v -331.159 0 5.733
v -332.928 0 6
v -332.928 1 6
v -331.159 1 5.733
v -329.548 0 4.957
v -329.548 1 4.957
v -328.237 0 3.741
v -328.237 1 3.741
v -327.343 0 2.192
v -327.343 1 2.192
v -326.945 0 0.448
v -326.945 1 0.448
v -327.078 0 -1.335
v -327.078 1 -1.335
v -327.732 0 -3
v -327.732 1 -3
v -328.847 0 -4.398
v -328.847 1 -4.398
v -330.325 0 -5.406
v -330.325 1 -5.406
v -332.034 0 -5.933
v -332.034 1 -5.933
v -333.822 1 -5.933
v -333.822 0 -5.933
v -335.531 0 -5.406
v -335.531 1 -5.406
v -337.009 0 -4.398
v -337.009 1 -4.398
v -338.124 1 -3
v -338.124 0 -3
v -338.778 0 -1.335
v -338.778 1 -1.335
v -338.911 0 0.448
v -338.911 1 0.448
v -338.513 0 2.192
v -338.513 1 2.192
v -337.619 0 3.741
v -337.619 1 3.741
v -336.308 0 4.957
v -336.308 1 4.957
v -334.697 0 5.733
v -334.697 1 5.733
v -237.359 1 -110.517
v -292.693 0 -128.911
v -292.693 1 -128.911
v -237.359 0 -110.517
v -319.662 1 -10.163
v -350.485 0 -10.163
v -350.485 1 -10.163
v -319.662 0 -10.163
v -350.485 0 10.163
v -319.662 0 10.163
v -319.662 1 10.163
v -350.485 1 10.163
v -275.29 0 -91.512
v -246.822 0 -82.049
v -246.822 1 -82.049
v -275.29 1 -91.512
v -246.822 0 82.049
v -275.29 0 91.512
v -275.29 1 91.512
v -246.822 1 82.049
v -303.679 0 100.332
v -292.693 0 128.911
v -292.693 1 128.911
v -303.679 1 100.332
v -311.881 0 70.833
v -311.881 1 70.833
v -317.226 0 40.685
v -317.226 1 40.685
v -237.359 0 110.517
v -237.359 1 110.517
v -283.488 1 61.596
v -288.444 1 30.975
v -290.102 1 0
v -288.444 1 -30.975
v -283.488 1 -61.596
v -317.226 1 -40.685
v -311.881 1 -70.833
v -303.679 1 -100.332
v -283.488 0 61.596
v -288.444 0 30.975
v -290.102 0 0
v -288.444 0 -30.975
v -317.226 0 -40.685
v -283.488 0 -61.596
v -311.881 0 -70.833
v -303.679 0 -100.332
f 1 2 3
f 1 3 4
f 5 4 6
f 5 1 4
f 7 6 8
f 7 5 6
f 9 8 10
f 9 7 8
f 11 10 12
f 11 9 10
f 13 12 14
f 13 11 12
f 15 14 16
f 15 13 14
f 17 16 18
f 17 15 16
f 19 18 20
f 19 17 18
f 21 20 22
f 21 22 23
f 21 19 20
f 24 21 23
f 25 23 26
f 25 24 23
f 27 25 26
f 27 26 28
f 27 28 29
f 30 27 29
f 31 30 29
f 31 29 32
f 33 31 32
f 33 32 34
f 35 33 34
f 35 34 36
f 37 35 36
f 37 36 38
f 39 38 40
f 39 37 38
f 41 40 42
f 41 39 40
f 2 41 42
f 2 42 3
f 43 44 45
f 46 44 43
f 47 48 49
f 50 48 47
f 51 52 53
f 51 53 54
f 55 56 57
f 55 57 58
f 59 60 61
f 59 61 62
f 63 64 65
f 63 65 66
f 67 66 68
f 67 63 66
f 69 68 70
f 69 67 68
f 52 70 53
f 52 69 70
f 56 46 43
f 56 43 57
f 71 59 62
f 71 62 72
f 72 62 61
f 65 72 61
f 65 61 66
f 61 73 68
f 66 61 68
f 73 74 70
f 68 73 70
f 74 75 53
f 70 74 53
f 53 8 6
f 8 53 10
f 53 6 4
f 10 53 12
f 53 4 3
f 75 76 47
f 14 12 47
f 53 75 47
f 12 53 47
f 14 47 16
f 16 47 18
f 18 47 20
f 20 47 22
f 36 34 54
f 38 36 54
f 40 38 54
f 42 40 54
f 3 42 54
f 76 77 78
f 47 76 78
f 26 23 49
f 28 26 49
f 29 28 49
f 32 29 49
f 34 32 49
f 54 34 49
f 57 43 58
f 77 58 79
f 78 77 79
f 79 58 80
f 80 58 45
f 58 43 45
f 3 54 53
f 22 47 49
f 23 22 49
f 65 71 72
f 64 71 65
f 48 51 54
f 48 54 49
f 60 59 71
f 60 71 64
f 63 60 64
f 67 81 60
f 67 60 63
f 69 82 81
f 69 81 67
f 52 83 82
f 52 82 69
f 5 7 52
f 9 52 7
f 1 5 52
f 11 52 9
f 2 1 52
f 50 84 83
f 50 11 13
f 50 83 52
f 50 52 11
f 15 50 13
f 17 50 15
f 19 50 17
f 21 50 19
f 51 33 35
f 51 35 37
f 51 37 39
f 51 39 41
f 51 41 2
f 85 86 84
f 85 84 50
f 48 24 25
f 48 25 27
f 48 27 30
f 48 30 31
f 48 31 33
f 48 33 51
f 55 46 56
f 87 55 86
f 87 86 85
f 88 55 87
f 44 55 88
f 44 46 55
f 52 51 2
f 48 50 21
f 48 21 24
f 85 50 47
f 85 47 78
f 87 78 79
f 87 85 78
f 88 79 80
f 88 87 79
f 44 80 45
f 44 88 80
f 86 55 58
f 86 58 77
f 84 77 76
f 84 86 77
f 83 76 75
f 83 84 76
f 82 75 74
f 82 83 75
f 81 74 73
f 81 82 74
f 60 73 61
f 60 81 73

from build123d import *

# Parameters (mm, degrees)
SKETCH1_R           = 6
BOSS_EXTRUDE1_DEPTH = 1


with BuildPart() as part:
    # Sketch1 → Boss-Extrude1 (new body)
    with BuildSketch(Plane(origin=(0, 0, 0), x_dir=(1, 0, 0), z_dir=(0, 1, 0))):
        with BuildLine():
            Line((-246.822195025, 82.048831977), (-275.290477825, 91.512281372))
            ThreePointArc((-275.290477825, 91.512281372), (-290.102300616, 0), (-275.290477825, -91.512281372))
            Line((-275.290477825, -91.512281372), (-246.822195025, -82.048831977))
            Line((-246.822195025, -82.048831977), (-237.35874563, -110.517114777))
            Line((-237.35874563, -110.517114777), (-292.692887429, -128.911334562))
            ThreePointArc((-292.692887429, -128.911334562), (-311.881352351, -70.832764917), (-319.66226604, -10.163375435))
            Line((-319.66226604, -10.163375435), (-350.484670263, -10.163375435))
            Line((-350.484670263, -10.163375435), (-350.484670263, 10.163375435))
            Line((-350.484670263, 10.163375435), (-319.66226604, 10.163375435))
            ThreePointArc((-319.66226604, 10.163375435), (-311.881352351, 70.832764917), (-292.692887429, 128.911334562))
            Line((-292.692887429, 128.911334562), (-237.35874563, 110.517114777))
            Line((-237.35874563, 110.517114777), (-246.822195025, 82.048831977))
        make_face()
        with Locations(Location((-332.928005197, 0, 0), (0, 0, 270))):
            Circle(SKETCH1_R, mode=Mode.SUBTRACT)
    extrude(amount=BOSS_EXTRUDE1_DEPTH)


solid = part.part
